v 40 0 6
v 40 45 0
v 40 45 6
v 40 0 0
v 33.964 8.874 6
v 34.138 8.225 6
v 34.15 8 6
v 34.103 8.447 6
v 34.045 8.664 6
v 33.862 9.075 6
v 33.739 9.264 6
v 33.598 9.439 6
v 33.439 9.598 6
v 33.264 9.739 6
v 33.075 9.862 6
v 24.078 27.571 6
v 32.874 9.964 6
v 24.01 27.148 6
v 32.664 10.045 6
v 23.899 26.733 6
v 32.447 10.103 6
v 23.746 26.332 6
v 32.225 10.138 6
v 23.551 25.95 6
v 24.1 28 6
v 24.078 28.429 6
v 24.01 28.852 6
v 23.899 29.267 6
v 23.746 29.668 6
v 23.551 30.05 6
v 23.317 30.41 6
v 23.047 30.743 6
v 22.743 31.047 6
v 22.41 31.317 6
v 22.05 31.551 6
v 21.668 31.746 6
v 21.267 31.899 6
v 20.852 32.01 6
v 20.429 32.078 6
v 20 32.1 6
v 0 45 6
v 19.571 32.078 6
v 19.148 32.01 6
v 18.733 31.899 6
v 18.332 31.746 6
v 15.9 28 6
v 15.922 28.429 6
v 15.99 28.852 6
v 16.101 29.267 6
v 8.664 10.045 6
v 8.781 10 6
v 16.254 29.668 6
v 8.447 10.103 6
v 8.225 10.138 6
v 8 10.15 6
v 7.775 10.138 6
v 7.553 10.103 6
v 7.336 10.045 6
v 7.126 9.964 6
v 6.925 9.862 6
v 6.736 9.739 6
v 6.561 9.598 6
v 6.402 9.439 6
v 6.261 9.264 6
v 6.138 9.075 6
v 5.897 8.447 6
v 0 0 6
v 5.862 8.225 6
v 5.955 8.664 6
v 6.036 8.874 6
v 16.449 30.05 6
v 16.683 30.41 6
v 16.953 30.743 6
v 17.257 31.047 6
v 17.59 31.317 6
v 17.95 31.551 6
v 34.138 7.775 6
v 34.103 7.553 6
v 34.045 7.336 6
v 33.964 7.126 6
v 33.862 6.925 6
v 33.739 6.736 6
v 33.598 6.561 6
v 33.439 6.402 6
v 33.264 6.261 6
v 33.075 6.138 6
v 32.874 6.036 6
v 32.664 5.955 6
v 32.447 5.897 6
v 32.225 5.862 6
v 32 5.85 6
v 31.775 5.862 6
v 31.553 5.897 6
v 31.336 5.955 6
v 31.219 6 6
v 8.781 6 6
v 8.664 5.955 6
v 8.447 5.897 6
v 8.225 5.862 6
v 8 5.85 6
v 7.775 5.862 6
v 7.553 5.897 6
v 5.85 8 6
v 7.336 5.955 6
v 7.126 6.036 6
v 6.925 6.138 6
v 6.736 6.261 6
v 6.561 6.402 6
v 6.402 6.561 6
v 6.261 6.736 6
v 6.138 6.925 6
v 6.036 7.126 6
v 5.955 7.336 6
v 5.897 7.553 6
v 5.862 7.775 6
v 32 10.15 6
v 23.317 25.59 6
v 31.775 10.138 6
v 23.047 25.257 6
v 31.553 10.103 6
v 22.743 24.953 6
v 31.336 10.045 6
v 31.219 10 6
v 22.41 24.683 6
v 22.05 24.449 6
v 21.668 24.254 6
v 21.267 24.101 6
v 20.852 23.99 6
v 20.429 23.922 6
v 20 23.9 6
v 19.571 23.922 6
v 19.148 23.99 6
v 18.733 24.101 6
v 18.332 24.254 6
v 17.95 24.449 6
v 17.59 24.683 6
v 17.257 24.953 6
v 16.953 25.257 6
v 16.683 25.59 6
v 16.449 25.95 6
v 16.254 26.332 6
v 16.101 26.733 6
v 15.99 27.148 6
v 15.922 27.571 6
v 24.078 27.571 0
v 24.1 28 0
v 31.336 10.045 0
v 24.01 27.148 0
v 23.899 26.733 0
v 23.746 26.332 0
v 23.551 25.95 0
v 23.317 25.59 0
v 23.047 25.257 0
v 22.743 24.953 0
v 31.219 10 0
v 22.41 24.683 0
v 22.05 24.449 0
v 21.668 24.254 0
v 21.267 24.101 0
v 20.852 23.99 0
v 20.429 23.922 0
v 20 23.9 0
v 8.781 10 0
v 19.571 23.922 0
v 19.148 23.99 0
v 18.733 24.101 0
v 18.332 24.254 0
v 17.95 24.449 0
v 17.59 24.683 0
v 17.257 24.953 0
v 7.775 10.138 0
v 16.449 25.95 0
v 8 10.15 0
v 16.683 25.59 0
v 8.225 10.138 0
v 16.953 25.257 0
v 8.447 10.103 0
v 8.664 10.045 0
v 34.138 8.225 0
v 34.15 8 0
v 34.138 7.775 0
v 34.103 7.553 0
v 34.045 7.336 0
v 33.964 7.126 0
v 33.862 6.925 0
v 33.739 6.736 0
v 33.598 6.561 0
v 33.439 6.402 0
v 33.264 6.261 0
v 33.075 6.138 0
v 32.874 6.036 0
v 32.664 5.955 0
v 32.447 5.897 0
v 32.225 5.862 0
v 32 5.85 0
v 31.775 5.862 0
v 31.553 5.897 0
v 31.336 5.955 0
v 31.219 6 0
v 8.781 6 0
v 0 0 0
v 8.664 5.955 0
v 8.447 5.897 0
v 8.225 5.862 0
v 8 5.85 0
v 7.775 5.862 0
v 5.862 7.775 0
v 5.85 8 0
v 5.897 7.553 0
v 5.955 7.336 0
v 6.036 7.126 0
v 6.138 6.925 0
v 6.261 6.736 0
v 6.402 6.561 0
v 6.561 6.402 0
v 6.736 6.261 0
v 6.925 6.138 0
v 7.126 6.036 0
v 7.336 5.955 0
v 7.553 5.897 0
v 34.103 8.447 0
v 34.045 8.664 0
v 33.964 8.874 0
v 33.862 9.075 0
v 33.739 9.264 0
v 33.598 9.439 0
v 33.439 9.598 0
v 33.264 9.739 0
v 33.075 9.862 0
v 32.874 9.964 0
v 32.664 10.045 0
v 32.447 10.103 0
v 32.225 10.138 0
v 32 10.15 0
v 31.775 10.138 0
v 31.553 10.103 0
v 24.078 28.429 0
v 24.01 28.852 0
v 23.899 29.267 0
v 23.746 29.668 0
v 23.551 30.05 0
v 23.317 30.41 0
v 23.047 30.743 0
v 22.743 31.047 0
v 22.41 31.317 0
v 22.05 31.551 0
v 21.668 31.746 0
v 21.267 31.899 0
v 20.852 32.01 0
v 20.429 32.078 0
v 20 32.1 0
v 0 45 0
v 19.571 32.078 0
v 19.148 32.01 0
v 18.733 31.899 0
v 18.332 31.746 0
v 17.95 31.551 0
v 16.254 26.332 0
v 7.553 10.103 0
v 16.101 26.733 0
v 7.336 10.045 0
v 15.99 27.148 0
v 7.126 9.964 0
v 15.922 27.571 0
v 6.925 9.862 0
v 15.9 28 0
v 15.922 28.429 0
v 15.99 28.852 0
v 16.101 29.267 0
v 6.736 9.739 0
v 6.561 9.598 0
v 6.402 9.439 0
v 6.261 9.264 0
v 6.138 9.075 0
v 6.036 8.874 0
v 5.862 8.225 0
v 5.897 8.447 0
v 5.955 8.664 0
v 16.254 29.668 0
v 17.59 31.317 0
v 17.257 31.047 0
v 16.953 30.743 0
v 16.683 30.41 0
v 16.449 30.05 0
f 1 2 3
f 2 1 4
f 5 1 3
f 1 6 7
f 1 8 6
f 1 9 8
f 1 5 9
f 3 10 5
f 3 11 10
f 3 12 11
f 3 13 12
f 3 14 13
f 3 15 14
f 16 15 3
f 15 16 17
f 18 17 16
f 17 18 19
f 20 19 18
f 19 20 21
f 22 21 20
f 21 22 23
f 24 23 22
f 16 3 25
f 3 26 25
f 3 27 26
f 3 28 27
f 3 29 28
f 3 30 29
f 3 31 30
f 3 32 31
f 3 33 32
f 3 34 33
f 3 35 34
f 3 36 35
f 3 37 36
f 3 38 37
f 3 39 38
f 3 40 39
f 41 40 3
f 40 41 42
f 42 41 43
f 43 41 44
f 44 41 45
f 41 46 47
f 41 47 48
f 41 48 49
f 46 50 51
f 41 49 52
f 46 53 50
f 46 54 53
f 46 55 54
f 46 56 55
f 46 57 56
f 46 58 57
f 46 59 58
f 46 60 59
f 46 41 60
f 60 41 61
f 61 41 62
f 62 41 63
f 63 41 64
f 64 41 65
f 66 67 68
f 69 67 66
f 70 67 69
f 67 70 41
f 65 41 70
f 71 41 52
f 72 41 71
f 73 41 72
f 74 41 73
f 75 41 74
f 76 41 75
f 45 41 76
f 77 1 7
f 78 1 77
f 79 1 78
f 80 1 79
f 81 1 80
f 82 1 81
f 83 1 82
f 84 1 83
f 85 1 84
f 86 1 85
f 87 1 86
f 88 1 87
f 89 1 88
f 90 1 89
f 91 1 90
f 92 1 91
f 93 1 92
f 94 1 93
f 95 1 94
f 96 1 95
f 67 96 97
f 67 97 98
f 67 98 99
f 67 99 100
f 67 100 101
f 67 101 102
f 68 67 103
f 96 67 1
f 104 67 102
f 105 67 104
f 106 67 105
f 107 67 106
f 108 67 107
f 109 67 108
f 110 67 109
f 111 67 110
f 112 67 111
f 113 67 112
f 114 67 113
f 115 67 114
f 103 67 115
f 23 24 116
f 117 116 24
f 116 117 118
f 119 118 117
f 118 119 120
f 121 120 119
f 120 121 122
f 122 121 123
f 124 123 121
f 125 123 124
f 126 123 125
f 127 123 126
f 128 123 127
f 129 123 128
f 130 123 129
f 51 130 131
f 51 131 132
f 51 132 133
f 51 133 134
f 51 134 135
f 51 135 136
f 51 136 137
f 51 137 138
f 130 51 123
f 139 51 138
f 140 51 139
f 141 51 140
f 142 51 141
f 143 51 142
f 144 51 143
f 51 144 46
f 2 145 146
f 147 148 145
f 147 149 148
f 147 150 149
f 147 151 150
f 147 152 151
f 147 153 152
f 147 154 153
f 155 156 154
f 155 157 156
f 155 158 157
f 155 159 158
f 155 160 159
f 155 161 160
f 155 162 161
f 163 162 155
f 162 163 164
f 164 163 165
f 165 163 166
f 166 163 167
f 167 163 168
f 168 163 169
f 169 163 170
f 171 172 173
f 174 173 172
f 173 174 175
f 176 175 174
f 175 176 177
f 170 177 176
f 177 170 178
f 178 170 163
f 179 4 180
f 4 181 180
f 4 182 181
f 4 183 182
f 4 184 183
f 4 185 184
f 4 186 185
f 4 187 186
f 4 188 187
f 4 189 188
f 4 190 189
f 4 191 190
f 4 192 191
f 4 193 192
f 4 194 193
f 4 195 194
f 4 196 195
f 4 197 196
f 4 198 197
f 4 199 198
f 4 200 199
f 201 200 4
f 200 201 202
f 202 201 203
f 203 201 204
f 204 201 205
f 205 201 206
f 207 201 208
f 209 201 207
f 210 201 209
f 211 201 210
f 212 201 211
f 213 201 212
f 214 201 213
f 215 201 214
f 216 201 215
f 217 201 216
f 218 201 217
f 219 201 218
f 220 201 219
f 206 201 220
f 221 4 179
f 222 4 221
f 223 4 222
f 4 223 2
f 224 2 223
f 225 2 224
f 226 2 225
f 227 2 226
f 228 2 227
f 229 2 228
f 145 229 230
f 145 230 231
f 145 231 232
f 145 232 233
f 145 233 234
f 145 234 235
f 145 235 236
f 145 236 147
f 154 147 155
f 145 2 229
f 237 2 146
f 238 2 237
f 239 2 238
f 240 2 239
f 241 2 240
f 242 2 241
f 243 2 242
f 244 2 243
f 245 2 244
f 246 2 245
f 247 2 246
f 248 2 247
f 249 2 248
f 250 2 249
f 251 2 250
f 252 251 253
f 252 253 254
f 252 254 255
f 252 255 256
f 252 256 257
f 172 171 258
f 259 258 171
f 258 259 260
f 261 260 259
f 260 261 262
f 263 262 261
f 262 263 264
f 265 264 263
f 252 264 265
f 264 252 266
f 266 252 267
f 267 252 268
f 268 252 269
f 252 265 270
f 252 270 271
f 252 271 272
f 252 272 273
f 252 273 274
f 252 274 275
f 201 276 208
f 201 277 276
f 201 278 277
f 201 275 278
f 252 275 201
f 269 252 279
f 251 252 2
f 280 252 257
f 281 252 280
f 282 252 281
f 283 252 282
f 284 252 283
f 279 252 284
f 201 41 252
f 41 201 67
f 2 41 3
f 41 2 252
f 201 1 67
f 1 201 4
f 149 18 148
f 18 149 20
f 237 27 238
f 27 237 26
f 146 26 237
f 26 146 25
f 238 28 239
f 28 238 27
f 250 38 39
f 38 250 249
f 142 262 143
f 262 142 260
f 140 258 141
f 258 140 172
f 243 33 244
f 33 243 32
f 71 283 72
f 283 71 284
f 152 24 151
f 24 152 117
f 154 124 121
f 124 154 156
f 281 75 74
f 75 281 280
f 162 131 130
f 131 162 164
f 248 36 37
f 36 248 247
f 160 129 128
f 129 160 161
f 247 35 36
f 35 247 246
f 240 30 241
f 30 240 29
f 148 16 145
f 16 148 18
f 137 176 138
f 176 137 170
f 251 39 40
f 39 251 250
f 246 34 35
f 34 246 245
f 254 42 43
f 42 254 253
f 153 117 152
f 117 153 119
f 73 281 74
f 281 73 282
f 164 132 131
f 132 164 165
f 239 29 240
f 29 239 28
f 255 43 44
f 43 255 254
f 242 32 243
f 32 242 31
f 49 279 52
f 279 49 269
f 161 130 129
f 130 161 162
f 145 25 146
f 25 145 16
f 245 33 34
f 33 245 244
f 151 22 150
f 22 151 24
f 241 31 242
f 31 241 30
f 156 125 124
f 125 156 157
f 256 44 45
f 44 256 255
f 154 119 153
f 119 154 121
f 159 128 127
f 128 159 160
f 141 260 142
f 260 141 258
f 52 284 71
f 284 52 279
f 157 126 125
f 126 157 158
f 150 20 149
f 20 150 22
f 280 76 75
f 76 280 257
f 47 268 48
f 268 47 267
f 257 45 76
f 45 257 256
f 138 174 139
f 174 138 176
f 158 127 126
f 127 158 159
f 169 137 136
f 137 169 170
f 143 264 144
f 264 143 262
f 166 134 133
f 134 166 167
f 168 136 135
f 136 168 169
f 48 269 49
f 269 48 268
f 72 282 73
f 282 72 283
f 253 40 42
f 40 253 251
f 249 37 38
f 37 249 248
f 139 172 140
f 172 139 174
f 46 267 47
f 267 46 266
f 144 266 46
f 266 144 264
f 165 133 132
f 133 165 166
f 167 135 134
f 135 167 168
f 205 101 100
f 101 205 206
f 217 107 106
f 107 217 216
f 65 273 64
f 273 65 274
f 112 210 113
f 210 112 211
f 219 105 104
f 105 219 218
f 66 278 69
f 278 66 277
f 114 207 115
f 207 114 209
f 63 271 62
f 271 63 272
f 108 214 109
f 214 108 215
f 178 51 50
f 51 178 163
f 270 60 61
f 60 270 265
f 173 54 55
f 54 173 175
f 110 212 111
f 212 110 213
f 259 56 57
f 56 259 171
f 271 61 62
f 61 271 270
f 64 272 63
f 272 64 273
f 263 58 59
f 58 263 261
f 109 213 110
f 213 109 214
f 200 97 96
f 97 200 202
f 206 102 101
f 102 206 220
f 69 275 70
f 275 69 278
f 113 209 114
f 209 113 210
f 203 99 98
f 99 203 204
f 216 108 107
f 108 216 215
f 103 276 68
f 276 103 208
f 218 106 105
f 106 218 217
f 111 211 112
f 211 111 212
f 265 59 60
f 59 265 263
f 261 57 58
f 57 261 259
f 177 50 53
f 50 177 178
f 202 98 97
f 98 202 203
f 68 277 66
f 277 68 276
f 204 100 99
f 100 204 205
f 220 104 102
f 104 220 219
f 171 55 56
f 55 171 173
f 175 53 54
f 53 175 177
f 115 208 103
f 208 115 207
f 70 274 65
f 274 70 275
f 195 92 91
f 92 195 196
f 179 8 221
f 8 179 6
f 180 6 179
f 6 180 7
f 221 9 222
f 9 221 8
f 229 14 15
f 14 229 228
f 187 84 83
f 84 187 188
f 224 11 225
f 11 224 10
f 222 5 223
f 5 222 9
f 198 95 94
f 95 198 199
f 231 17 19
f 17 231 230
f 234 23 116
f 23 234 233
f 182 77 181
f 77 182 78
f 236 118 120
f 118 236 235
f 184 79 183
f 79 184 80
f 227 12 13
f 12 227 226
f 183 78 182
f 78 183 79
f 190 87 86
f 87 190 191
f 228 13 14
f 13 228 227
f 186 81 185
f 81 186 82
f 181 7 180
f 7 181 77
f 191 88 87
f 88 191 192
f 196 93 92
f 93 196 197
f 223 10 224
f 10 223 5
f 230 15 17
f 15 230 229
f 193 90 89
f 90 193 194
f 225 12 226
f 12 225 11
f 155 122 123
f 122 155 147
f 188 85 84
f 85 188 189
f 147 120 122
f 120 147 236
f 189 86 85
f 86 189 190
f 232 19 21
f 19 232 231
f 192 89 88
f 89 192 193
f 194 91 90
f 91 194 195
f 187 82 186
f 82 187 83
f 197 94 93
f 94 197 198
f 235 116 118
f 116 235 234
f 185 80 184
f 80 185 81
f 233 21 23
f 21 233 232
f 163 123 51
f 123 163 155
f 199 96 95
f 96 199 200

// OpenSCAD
// Sıfır Atık YZ - Konveyör Bant Rulo Gergi ve Yataklama Parçası
// Standart 608zz rulman (8x22x7mm) ve 2020 sigma profil kızak yapısına uyumludur.

$fn = 60;

bracket_w = 40;
bracket_h = 45;
base_t = 6;

module tensioner() {
    difference() {
        cube([bracket_w, bracket_h, base_t]);

        // 608zz Rulman Yuvası (22mm Çap, 7mm Derinlik)
        translate([bracket_w/2, 28, -1])
            cylinder(h = base_t + 2, d = 8.2); // 8mm Mil geçiş deliği
            
        // Gergi Slotu (M4 vida ile ileri-geri gerdirme kanalı)
        translate([8, 8, -1])
            cylinder(h = base_t + 2, d = 4.3);
        translate([bracket_w - 8, 8, -1])
            cylinder(h = base_t + 2, d = 4.3);
            
        translate([8, 6, -1])
            cube([bracket_w - 16, 4, base_t + 2]);
    }
}

tensioner();
